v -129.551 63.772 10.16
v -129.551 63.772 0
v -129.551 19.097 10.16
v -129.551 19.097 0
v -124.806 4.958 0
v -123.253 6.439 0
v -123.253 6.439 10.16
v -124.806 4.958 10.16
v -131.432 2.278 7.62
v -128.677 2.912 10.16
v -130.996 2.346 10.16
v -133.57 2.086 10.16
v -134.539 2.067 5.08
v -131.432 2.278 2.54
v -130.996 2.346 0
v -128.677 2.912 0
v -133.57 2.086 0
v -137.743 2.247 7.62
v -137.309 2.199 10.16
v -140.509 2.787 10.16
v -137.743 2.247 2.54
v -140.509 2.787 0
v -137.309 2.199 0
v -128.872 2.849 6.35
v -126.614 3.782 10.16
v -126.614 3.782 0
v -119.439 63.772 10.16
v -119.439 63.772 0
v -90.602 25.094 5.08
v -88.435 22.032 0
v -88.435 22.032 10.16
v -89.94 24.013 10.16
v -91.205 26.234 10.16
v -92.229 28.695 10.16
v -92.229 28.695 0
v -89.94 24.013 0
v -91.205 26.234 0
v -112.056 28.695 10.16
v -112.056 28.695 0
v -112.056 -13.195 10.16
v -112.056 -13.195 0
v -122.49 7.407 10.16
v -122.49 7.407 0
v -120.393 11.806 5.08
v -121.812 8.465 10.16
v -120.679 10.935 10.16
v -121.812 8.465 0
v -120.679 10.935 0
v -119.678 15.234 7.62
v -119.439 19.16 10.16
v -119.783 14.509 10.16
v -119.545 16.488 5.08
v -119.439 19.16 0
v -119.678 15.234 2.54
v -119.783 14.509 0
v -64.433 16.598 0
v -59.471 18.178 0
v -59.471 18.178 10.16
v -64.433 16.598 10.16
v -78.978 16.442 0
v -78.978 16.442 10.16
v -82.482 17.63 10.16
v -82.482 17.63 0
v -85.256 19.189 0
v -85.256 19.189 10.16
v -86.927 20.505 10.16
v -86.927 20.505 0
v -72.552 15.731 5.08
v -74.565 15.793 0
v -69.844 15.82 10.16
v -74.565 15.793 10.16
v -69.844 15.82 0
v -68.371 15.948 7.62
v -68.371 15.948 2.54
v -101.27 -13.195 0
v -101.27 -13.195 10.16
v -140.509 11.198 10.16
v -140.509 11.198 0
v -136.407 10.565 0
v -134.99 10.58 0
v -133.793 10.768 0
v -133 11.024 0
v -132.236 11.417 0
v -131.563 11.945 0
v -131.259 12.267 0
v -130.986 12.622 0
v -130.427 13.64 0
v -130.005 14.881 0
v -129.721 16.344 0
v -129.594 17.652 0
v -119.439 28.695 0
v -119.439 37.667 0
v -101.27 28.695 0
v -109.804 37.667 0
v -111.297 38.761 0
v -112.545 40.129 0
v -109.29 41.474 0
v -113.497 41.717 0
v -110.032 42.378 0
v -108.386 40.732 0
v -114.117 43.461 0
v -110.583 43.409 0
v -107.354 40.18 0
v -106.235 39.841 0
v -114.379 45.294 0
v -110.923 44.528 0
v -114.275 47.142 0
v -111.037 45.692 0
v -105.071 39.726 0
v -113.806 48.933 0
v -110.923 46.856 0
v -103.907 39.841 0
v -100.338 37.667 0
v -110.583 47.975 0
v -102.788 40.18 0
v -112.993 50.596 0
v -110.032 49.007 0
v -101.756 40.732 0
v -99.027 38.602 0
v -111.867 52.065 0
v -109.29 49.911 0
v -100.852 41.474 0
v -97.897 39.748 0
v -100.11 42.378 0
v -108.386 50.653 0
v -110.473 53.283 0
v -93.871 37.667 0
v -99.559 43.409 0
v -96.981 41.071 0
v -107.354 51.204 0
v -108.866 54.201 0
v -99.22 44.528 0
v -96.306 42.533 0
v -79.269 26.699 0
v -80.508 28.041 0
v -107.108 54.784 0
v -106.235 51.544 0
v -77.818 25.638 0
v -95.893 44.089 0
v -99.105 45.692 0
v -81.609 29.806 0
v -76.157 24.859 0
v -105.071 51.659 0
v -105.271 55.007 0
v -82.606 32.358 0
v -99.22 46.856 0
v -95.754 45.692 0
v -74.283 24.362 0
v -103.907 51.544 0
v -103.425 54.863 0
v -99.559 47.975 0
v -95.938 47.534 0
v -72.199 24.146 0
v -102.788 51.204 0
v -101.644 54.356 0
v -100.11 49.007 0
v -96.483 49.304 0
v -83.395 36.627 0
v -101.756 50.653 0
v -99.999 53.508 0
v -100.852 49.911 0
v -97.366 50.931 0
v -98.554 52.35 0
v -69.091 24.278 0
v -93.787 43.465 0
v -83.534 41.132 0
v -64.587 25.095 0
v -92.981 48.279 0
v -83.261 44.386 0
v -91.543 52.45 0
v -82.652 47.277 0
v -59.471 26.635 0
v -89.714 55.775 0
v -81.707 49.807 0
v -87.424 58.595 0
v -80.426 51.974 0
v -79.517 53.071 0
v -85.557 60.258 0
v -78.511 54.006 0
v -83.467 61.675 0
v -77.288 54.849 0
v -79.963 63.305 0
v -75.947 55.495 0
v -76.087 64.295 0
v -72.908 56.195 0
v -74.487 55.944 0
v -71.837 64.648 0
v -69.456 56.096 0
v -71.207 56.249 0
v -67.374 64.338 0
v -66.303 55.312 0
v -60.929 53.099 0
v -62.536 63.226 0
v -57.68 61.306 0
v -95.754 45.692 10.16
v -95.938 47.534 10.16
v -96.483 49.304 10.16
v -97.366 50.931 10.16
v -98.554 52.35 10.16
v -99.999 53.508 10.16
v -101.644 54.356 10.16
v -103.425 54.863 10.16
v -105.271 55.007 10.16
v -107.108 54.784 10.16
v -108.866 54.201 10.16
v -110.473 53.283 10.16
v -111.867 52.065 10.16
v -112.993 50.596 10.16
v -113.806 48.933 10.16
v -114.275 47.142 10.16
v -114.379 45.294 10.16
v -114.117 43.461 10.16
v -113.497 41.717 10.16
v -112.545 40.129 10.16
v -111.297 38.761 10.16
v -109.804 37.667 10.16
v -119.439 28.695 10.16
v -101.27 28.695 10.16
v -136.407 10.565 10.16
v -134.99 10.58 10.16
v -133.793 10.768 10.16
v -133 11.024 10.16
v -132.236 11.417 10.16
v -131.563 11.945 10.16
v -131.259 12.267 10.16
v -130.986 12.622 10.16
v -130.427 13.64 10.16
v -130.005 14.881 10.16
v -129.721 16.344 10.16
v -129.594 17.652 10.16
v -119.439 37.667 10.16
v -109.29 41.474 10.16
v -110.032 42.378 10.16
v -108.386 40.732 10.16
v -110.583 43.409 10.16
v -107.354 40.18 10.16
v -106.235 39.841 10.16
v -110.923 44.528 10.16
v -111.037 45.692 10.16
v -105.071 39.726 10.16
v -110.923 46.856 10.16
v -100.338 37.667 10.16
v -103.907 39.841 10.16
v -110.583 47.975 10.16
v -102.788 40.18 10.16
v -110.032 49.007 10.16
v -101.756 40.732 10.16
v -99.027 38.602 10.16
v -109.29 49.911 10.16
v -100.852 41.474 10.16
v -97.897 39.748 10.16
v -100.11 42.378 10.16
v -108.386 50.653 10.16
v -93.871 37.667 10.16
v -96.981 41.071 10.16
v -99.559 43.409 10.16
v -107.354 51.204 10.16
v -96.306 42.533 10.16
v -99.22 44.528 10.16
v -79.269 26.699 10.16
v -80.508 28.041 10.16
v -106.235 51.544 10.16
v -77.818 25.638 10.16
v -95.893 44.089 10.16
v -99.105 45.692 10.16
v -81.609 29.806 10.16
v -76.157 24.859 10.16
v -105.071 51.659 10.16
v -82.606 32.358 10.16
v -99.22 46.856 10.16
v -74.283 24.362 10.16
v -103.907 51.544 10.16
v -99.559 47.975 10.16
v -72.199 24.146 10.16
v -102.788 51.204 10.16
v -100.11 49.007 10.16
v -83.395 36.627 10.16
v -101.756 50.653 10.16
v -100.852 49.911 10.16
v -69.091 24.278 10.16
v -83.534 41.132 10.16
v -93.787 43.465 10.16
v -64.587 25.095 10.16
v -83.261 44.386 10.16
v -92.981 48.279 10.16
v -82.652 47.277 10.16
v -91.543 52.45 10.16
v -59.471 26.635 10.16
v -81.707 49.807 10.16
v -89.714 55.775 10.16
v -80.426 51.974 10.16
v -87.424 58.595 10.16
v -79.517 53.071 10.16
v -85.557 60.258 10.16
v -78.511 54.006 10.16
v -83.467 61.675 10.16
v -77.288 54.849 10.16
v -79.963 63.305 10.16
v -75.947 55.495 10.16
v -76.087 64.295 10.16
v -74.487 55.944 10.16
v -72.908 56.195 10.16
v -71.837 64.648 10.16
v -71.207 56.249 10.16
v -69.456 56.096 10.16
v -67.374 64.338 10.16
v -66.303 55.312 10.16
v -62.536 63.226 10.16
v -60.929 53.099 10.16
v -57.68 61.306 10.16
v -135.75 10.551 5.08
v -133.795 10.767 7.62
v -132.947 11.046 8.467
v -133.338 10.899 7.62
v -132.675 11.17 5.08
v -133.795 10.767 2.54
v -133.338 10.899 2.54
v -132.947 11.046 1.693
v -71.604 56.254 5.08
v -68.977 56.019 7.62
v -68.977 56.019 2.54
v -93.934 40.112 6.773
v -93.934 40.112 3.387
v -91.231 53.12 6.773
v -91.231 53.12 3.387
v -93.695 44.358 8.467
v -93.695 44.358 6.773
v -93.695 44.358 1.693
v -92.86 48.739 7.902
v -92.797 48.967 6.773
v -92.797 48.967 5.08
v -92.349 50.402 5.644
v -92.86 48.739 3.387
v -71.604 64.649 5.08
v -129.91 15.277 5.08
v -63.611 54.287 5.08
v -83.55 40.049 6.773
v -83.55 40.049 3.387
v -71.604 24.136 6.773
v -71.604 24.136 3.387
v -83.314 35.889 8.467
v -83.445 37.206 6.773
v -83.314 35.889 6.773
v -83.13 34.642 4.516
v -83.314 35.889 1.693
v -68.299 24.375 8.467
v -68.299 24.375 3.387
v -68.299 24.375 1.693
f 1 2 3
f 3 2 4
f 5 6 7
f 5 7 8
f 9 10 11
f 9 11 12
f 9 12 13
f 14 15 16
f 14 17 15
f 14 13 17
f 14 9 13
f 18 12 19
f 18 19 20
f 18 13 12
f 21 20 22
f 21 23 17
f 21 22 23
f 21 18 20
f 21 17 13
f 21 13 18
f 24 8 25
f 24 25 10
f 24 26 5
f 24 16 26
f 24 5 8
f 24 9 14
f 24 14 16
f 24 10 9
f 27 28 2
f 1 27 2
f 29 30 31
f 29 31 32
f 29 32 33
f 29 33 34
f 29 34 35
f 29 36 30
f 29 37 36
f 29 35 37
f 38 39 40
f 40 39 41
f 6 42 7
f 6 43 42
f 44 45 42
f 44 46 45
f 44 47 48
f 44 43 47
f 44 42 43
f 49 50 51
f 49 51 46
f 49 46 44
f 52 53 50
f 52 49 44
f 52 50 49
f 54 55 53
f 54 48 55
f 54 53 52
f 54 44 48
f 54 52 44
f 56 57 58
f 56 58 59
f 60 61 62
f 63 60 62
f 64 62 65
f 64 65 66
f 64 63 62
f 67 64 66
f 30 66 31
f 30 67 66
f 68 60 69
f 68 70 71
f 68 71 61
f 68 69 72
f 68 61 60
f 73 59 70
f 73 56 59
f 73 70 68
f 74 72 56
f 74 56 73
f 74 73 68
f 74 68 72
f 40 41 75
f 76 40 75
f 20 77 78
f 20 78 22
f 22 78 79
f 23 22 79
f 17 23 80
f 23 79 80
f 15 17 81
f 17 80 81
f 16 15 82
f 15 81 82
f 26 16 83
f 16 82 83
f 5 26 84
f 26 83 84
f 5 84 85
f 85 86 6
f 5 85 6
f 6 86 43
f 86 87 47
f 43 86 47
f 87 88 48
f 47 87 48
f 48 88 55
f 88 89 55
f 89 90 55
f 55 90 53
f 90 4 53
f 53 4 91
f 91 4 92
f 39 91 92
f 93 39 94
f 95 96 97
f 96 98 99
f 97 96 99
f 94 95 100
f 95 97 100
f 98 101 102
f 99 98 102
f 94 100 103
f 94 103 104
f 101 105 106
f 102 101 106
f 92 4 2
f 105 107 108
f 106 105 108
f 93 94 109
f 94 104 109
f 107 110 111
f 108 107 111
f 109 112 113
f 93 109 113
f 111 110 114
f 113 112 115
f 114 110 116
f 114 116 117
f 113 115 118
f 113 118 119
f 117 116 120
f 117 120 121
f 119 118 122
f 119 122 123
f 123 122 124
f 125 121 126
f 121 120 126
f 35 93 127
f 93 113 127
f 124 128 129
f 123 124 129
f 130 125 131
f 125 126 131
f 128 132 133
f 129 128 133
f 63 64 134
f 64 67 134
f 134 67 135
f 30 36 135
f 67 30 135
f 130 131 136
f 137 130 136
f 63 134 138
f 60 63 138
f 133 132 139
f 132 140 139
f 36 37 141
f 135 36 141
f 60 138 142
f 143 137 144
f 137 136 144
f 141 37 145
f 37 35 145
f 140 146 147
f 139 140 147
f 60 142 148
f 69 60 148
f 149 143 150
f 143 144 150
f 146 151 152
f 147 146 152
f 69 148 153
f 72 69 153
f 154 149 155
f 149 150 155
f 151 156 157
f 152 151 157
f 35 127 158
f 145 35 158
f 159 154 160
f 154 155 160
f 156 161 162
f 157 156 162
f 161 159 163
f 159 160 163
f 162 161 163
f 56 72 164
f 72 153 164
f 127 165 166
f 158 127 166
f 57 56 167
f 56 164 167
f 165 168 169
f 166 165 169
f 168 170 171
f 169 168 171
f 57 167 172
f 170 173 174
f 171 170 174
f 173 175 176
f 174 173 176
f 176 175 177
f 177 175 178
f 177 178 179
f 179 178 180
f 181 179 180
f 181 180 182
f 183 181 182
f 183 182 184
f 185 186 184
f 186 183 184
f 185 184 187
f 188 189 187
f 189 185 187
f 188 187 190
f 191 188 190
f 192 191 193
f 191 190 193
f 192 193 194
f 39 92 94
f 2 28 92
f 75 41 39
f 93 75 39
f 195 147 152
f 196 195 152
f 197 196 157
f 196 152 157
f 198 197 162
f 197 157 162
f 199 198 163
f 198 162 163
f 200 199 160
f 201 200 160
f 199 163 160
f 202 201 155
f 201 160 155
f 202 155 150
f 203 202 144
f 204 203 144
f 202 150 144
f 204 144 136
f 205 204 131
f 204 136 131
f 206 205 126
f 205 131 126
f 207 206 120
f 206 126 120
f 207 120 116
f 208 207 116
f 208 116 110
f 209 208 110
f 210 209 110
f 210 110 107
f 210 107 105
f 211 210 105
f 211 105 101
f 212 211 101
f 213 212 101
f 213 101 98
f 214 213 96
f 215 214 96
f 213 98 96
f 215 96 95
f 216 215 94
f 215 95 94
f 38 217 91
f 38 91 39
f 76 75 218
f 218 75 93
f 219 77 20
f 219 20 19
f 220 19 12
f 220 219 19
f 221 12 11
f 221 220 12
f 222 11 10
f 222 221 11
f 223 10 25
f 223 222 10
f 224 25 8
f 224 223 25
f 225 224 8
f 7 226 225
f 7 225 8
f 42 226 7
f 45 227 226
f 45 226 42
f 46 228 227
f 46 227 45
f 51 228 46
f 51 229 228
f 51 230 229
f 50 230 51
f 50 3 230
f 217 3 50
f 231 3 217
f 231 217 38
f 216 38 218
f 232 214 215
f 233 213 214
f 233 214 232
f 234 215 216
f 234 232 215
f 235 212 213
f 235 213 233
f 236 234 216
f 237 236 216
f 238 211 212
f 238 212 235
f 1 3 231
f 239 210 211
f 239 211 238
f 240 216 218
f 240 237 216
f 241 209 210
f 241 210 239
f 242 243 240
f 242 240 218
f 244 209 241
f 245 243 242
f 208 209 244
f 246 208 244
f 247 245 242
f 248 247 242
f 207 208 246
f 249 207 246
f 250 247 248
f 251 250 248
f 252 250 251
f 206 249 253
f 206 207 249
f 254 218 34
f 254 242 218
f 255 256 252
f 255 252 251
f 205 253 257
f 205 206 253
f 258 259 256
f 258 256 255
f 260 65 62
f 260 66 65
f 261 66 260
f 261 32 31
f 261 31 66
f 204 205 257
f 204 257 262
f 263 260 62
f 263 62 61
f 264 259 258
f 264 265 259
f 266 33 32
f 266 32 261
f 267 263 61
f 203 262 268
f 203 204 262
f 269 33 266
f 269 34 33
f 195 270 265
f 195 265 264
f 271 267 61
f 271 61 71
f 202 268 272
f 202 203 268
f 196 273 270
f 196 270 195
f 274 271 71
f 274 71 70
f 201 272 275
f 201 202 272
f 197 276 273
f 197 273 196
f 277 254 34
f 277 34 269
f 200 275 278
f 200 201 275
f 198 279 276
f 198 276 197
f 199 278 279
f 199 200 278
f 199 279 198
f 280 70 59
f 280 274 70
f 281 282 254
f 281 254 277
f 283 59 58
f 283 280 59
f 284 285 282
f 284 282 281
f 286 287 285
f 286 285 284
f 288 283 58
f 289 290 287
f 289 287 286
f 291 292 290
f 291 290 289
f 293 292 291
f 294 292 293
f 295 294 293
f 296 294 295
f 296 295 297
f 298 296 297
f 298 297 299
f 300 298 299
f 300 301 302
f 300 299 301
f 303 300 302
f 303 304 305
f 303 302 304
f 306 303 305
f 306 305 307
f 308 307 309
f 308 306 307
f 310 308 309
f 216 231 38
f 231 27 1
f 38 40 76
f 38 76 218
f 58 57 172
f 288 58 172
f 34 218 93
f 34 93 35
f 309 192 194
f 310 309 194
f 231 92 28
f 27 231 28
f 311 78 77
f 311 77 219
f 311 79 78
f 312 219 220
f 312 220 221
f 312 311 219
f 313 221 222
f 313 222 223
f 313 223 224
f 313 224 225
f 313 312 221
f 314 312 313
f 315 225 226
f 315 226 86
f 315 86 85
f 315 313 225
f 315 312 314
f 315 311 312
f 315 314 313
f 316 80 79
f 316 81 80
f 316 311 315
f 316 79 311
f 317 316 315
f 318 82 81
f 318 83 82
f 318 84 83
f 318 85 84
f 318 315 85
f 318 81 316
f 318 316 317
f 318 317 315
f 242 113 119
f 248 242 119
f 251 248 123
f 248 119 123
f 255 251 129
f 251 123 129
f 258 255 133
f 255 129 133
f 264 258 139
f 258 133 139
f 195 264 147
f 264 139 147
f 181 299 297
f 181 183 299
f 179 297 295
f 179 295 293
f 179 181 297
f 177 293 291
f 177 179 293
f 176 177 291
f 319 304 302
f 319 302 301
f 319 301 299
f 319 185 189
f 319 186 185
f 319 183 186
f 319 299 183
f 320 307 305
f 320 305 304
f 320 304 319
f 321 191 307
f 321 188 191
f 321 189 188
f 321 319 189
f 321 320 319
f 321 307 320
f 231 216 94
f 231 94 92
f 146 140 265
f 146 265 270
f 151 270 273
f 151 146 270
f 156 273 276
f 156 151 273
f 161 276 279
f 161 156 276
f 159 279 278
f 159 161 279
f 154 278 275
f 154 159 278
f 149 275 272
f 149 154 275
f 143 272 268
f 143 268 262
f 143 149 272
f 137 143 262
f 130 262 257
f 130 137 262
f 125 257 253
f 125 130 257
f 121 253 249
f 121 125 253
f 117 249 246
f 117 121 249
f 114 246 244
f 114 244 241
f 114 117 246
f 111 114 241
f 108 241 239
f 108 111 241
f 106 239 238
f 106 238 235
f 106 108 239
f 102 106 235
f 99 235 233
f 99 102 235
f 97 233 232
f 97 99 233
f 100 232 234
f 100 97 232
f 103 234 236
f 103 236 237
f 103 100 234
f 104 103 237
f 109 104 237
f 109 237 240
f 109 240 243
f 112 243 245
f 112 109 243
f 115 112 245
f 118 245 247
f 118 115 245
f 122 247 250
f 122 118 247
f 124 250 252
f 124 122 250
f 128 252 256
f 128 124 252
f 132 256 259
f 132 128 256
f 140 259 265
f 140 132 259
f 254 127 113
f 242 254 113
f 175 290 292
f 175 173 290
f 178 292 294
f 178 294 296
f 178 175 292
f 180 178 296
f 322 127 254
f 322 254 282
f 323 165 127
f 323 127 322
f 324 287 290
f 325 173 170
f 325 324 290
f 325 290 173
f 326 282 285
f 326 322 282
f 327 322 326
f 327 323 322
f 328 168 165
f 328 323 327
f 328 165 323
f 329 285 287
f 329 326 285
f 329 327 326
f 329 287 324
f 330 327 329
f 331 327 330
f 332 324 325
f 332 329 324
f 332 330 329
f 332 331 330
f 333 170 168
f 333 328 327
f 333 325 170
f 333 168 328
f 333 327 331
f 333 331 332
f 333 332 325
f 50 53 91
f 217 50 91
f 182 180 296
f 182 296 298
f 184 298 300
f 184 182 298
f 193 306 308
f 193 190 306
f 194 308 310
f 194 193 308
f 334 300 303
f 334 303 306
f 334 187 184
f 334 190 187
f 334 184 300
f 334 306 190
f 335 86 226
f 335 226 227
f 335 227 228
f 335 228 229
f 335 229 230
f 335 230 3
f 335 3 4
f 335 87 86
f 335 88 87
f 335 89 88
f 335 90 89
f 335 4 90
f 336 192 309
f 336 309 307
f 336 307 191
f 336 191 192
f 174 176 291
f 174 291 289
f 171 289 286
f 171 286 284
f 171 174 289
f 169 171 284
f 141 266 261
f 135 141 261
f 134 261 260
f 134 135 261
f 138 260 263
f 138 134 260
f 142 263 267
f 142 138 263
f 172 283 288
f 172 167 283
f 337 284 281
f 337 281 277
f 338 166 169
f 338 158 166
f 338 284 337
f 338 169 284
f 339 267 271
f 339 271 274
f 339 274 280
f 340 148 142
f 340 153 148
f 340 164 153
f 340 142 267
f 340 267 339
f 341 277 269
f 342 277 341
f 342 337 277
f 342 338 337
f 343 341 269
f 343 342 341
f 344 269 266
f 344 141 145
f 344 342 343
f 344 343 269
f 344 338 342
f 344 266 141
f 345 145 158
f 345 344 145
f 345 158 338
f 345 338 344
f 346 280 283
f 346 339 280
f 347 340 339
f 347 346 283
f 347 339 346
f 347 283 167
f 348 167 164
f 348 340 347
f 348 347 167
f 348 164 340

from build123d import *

# Parameters (mm, degrees)
F0_R     = 5.966240135
F0_W     = 6.4319284421
F0_H     = 8.9723766592
F1_DEPTH = 10.16


with BuildPart() as f1:
    # F0 (on Top) → F1 (new body)
    with BuildSketch(Plane.XY):
        with BuildLine():
            ThreePointArc((-100.3382074425, 37.6670937348), (-96.9809881445, 41.0712390667), (-95.7542298135, 45.6922985613))
            ThreePointArc((-95.7542298135, 45.6922985613), (-109.6921719724, 53.7824228946), (-109.804017513, 37.6670937348))
            Line((-109.804017513, 37.6670937348), (-100.3382074425, 37.6670937348))
        make_face()
        with Locations((-105.0711124778, 45.6922985613)):
            Circle(F0_R, mode=Mode.SUBTRACT)
        with BuildLine():
            Line((-100.3382074425, 37.6670937348), (-109.804017513, 37.6670937348))
            ThreePointArc((-109.804017513, 37.6670937348), (-105.0711124778, 36.3754158971), (-100.3382074425, 37.6670937348))
        make_face()
        with BuildLine():
            ThreePointArc((-100.3382074425, 37.6670937348), (-105.0711124778, 36.3754158971), (-109.804017513, 37.6670937348))
            Line((-109.804017513, 37.6670937348), (-119.439290472, 37.6670937348))
            Line((-119.439290472, 37.6670937348), (-119.439290472, 28.6947170757))
            Line((-119.439290472, 28.6947170757), (-112.0564305344, 28.6947170757))
            Line((-112.0564305344, 28.6947170757), (-112.0564305344, -13.194927302))
            Line((-112.0564305344, -13.194927302), (-101.2695409777, -13.194927302))
            Line((-101.2695409777, -13.194927302), (-101.2695409777, 28.6947170757))
            Line((-101.2695409777, 28.6947170757), (-92.2293317184, 28.6947170757))
            add(Edge.make_bspline(
                [(-92.2293317184, 28.6947170757), (-93.6078003439, 32.6255158205), (-93.8712663048, 37.6670937348)],
                knots=[0.4433037515, 0.4433037515, 0.4433037515, 0.8935989479, 0.8935989479, 0.8935989479], degree=2))
            Line((-93.8712663048, 37.6670937348), (-100.3382074425, 37.6670937348))
        make_face()
        with BuildLine():
            Line((-125.871218914, 37.6670937348), (-119.439290472, 37.6670937348))
            Line((-119.439290472, 37.6670937348), (-119.439290472, 63.7718132257))
            Line((-119.439290472, 63.7718132257), (-129.5512871852, 63.7718132257))
            Line((-129.5512871852, 63.7718132257), (-129.5512871852, 19.0974500375))
            add(Edge.make_bspline(
                [(-130.9861680398, 12.622224072), (-129.5512871852, 14.6936702511), (-129.5512871852, 19.0974500375)],
                knots=[0, 0, 0, 1, 1, 1], degree=2))
            add(Edge.make_bspline(
                [(-135.7499724769, 10.5507778929), (-132.4210488943, 10.5507778929), (-130.9861680398, 12.622224072)],
                knots=[0, 0, 0, 1, 1, 1], degree=2))
            add(Edge.make_bspline(
                [(-140.5085591655, 11.1977787146), (-137.8996848845, 10.5507778929), (-135.7499724769, 10.5507778929)],
                knots=[0, 0, 0, 1, 1, 1], degree=2))
            Line((-140.5085591655, 11.1977787146), (-140.5085591655, 2.7867680326))
            add(Edge.make_bspline(
                [(-134.5394548105, 2.066718731), (-137.9622978672, 2.066718731), (-140.5085591655, 2.7867680326)],
                knots=[0, 0, 0, 1, 1, 1], degree=2))
            add(Edge.make_bspline(
                [(-123.2534646708, 6.439192026), (-127.0676388697, 2.066718731), (-134.5394548105, 2.066718731)],
                knots=[0, 0, 0, 1, 1, 1], degree=2))
            add(Edge.make_bspline(
                [(-119.439290472, 19.1600630203), (-119.439290472, 10.811665321), (-123.2534646708, 6.439192026)],
                knots=[0, 0, 0, 1, 1, 1], degree=2))
            Line((-119.439290472, 19.1600630203), (-119.439290472, 28.6947170757))
            Line((-119.439290472, 28.6947170757), (-125.871218914, 28.6947170757))
            Line((-125.871218914, 28.6947170757), (-125.871218914, 37.6670937348))
        make_face()
        with Locations((-122.655254693, 33.1809054053)):
            Rectangle(F0_W, F0_H)
        with BuildLine():
            add(Edge.make_bspline(
                [(-93.8712663048, 37.6670937348), (-93.9335211449, 38.8583771389), (-93.9335211449, 40.1116795692)],
                knots=[0.8935989479, 0.8935989479, 0.8935989479, 1, 1, 1], degree=2))
            Line((-93.8712663048, 37.6670937348), (-87.465884579, 37.6670937348))
            Line((-87.465884579, 37.6670937348), (-87.465884579, 28.6947170757))
            Line((-87.465884579, 28.6947170757), (-92.2293317184, 28.6947170757))
            add(Edge.make_bspline(
                [(-88.4345520727, 22.0317358016), (-90.8722656918, 24.8249493235), (-92.2293317184, 28.6947170757)],
                knots=[0, 0, 0, 0.4433037515, 0.4433037515, 0.4433037515], degree=2))
            add(Edge.make_bspline(
                [(-72.5521129912, 15.7308337398), (-82.9355830005, 15.7308337398), (-88.4345520727, 22.0317358016)],
                knots=[0, 0, 0, 1, 1, 1], degree=2))
            add(Edge.make_bspline(
                [(-59.4712320165, 18.1782915654), (-65.3243013698, 15.7308337398), (-72.5521129912, 15.7308337398)],
                knots=[0, 0, 0, 1, 1, 1], degree=2))
            Line((-59.4712320165, 18.1782915654), (-59.4712320165, 26.6350394567))
            add(Edge.make_bspline(
                [(-71.6043740033, 24.1355080603), (-66.5948964963, 24.1355080603), (-59.4712320165, 26.6350394567)],
                knots=[0, 0, 0, 1, 1, 1], degree=2))
            add(Edge.make_bspline(
                [(-83.5500511355, 40.0491912843), (-83.5500511355, 24.1355080603), (-71.6043740033, 24.1355080603)],
                knots=[0, 0, 0, 1, 1, 1], degree=2))
            add(Edge.make_bspline(
                [(-80.4256368899, 51.9740389881), (-83.5500511355, 47.6935914717), (-83.5500511355, 40.0491912843)],
                knots=[0, 0, 0, 1, 1, 1], degree=2))
            add(Edge.make_bspline(
                [(-71.6043740033, 56.2544865045), (-77.3012226444, 56.2544865045), (-80.4256368899, 51.9740389881)],
                knots=[0, 0, 0, 1, 1, 1], degree=2))
            add(Edge.make_bspline(
                [(-66.3032845001, 55.3119548738), (-69.0006954654, 56.2544865045), (-71.6043740033, 56.2544865045)],
                knots=[0, 0, 0, 1, 1, 1], degree=2))
            add(Edge.make_bspline(
                [(-60.9292919977, 53.0988281165), (-63.6058735347, 54.369423243), (-66.3032845001, 55.3119548738)],
                knots=[0, 0, 0, 1, 1, 1], degree=2))
            Line((-60.9292919977, 53.0988281165), (-57.6799011823, 61.3056228681))
            add(Edge.make_bspline(
                [(-71.6043740033, 64.6487461109), (-64.6785890924, 64.6487461109), (-57.6799011823, 61.3056228681)],
                knots=[0, 0, 0, 1, 1, 1], degree=2))
            add(Edge.make_bspline(
                [(-83.4667334223, 61.6753452205), (-78.4051823445, 64.6487461109), (-71.6043740033, 64.6487461109)],
                knots=[0, 0, 0, 1, 1, 1], degree=2))
            add(Edge.make_bspline(
                [(-91.2309028225, 53.1196575448), (-88.5282845001, 58.7019443302), (-83.4667334223, 61.6753452205)],
                knots=[0, 0, 0, 1, 1, 1], degree=2))
            add(Edge.make_bspline(
                [(-93.9335211449, 40.1116795692), (-93.9335211449, 47.5373707594), (-91.2309028225, 53.1196575448)],
                knots=[0, 0, 0, 1, 1, 1], degree=2))
        make_face()
        with BuildLine():
            Line((-87.465884579, 37.6670937348), (-93.8712663048, 37.6670937348))
            add(Edge.make_bspline(
                [(-92.2293317184, 28.6947170757), (-93.6078003439, 32.6255158205), (-93.8712663048, 37.6670937348)],
                knots=[0.4433037515, 0.4433037515, 0.4433037515, 0.8935989479, 0.8935989479, 0.8935989479], degree=2))
            Line((-92.2293317184, 28.6947170757), (-87.465884579, 28.6947170757))
            Line((-87.465884579, 28.6947170757), (-87.465884579, 37.6670937348))
        make_face()
    extrude(amount=F1_DEPTH)


solid = f1.part
